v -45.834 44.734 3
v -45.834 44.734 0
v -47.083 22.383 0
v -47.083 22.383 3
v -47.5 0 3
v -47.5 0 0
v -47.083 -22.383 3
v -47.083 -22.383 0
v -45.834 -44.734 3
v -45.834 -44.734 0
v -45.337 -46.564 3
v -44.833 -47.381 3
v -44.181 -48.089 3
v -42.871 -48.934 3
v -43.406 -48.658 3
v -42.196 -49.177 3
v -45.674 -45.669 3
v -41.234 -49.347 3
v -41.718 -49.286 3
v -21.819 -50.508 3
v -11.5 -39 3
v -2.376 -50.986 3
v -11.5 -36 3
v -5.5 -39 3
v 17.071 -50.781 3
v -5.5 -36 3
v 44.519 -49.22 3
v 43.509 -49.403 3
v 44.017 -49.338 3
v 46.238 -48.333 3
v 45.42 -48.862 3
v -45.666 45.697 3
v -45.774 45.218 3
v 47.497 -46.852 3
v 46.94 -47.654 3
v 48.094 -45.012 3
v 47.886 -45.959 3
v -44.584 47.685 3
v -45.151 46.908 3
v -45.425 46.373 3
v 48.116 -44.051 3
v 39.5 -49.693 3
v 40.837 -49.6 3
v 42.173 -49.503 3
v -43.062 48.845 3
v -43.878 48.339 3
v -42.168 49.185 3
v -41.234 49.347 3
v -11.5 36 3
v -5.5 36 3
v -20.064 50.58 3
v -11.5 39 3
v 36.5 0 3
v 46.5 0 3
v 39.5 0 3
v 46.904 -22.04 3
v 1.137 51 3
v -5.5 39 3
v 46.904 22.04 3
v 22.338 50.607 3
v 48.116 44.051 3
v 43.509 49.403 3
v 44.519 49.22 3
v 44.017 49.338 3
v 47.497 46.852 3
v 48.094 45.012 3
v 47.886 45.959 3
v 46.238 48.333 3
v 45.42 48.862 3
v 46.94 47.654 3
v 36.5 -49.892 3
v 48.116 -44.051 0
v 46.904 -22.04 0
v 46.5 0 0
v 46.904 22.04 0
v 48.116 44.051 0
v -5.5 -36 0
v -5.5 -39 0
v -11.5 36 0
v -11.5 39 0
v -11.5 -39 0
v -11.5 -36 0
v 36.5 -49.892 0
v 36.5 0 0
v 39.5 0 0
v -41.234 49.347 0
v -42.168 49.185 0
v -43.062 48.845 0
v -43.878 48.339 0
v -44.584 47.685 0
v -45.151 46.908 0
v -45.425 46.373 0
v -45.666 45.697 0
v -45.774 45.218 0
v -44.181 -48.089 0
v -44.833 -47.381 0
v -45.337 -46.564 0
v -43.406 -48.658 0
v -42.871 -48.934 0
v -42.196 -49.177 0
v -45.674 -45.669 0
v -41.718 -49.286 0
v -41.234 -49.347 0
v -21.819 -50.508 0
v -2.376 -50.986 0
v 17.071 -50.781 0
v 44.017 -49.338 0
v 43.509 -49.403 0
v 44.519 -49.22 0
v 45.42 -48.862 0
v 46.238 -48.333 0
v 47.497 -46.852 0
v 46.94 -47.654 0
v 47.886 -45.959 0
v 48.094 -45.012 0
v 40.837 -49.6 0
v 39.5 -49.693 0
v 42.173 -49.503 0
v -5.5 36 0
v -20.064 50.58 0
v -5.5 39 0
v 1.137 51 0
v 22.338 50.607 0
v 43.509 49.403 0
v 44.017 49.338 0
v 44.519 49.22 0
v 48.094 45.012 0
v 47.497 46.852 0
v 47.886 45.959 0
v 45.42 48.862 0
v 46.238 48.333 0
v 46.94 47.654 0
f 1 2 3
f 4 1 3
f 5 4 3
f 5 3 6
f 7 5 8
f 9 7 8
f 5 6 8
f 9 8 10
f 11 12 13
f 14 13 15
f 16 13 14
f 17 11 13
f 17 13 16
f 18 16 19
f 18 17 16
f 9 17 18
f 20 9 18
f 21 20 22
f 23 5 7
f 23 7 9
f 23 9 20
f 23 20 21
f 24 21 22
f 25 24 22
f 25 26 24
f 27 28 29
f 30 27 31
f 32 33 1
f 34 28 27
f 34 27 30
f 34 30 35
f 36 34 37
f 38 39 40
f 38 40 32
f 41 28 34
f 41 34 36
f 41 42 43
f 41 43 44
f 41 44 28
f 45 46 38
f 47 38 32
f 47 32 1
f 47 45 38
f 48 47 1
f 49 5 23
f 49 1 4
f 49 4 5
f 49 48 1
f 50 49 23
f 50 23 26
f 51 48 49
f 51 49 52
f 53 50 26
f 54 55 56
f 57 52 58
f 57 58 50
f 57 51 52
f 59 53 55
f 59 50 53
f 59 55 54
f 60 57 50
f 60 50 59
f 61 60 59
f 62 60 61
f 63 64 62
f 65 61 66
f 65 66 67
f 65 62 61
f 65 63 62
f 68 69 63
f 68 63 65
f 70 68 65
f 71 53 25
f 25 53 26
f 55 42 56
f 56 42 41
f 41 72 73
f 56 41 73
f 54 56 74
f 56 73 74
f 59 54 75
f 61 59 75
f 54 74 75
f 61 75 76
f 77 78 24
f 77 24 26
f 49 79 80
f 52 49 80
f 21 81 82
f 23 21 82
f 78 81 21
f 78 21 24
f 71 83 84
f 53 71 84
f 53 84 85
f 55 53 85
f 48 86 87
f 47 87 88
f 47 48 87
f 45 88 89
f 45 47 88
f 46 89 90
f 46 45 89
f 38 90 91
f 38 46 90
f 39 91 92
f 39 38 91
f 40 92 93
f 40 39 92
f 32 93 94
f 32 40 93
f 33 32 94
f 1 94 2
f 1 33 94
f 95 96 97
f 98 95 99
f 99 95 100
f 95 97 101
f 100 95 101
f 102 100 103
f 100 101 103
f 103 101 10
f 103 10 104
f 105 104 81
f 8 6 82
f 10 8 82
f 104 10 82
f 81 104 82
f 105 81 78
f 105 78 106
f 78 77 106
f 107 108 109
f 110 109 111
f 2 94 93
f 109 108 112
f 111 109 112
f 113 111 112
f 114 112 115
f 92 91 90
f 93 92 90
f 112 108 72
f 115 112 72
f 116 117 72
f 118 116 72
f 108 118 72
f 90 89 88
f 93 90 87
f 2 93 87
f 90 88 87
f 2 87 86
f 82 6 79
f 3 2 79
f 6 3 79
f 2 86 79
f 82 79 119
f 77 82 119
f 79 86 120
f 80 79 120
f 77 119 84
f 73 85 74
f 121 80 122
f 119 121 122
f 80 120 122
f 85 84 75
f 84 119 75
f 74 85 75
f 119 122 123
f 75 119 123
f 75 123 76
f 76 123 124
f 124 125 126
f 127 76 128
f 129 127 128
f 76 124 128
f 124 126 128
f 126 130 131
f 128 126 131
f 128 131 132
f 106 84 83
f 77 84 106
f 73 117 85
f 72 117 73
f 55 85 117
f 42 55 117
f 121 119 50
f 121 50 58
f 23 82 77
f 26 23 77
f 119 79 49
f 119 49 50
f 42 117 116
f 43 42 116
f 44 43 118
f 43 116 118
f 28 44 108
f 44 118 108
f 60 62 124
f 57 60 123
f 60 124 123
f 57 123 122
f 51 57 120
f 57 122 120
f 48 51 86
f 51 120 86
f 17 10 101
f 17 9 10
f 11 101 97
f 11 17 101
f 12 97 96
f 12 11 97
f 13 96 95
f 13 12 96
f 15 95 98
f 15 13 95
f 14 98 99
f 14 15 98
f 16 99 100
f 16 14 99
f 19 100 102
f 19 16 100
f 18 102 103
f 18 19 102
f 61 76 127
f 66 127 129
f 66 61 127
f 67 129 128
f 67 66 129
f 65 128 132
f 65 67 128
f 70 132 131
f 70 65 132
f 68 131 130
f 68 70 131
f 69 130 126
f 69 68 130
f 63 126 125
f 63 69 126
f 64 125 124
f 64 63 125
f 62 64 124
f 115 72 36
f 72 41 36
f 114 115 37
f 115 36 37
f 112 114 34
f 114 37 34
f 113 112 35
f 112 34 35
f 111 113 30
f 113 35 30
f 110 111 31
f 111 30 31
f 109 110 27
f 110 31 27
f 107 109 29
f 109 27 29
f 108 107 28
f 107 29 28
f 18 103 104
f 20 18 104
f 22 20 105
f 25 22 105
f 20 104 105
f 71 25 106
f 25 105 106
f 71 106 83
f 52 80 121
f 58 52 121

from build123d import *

# Parameters (mm, degrees)
F1_W     = 6
F1_H     = 3
F2_DEPTH = 3
F3_R     = 5


with BuildPart() as f2:
    # F1 (on Top) → F2 (new body)
    with BuildSketch(Plane.XY):
        Polygon((39.5, -49), (45.5, -49), (45.5, 49), (-45.5, 49), (-45.5, -49), (36.5, -49), (36.5, 0), (39.5, 0), align=None)
        with Locations((-8.5, -37.5)):
            Rectangle(F1_W, F1_H, mode=Mode.SUBTRACT)
        with Locations((-8.5, 37.5)):
            Rectangle(F1_W, F1_H, mode=Mode.SUBTRACT)
        with BuildLine():
            Line((45.5, 49), (45.5, -49))
            Line((45.5, -49), (48.5, -49))
            ThreePointArc((48.5, -49), (46.5, 0), (48.5, 49))
            Line((48.5, 49), (45.5, 49))
        make_face()
        with BuildLine():
            Line((36.5, -49.8917956467), (36.5, -49))
            Line((36.5, -49), (-45.5, -49))
            ThreePointArc((-45.5, -49), (-4.5165459251, -50.9672843243), (36.5, -49.8917956467))
        make_face()
        with BuildLine():
            Line((48.5, -49), (45.5, -49))
            Line((45.5, -49), (39.5, -49))
            Line((39.5, -49), (39.5, -49.6934413959))
            ThreePointArc((39.5, -49.6934413959), (44.0014142734, -49.3650761942), (48.5, -49))
        make_face()
        with BuildLine():
            Line((-45.5, 49), (45.5, 49))
            Line((45.5, 49), (48.5, 49))
            ThreePointArc((48.5, 49), (1.5, 51), (-45.5, 49))
        make_face()
        with BuildLine():
            Line((-45.5, -49), (-45.5, 49))
            ThreePointArc((-45.5, 49), (-47.5, 0), (-45.5, -49))
        make_face()
    extrude(amount=F2_DEPTH)

    # F3
    f3_edges = [f2.edges().sort_by_distance(p)[0] for p in [
        (-45.5, -49, 1.5),
        (-45.5, 49, 1.5),
        (48.5, -49, 1.5),
        (48.5, 49, 1.5),
    ]]
    fillet(f3_edges, radius=F3_R)


solid = f2.part
